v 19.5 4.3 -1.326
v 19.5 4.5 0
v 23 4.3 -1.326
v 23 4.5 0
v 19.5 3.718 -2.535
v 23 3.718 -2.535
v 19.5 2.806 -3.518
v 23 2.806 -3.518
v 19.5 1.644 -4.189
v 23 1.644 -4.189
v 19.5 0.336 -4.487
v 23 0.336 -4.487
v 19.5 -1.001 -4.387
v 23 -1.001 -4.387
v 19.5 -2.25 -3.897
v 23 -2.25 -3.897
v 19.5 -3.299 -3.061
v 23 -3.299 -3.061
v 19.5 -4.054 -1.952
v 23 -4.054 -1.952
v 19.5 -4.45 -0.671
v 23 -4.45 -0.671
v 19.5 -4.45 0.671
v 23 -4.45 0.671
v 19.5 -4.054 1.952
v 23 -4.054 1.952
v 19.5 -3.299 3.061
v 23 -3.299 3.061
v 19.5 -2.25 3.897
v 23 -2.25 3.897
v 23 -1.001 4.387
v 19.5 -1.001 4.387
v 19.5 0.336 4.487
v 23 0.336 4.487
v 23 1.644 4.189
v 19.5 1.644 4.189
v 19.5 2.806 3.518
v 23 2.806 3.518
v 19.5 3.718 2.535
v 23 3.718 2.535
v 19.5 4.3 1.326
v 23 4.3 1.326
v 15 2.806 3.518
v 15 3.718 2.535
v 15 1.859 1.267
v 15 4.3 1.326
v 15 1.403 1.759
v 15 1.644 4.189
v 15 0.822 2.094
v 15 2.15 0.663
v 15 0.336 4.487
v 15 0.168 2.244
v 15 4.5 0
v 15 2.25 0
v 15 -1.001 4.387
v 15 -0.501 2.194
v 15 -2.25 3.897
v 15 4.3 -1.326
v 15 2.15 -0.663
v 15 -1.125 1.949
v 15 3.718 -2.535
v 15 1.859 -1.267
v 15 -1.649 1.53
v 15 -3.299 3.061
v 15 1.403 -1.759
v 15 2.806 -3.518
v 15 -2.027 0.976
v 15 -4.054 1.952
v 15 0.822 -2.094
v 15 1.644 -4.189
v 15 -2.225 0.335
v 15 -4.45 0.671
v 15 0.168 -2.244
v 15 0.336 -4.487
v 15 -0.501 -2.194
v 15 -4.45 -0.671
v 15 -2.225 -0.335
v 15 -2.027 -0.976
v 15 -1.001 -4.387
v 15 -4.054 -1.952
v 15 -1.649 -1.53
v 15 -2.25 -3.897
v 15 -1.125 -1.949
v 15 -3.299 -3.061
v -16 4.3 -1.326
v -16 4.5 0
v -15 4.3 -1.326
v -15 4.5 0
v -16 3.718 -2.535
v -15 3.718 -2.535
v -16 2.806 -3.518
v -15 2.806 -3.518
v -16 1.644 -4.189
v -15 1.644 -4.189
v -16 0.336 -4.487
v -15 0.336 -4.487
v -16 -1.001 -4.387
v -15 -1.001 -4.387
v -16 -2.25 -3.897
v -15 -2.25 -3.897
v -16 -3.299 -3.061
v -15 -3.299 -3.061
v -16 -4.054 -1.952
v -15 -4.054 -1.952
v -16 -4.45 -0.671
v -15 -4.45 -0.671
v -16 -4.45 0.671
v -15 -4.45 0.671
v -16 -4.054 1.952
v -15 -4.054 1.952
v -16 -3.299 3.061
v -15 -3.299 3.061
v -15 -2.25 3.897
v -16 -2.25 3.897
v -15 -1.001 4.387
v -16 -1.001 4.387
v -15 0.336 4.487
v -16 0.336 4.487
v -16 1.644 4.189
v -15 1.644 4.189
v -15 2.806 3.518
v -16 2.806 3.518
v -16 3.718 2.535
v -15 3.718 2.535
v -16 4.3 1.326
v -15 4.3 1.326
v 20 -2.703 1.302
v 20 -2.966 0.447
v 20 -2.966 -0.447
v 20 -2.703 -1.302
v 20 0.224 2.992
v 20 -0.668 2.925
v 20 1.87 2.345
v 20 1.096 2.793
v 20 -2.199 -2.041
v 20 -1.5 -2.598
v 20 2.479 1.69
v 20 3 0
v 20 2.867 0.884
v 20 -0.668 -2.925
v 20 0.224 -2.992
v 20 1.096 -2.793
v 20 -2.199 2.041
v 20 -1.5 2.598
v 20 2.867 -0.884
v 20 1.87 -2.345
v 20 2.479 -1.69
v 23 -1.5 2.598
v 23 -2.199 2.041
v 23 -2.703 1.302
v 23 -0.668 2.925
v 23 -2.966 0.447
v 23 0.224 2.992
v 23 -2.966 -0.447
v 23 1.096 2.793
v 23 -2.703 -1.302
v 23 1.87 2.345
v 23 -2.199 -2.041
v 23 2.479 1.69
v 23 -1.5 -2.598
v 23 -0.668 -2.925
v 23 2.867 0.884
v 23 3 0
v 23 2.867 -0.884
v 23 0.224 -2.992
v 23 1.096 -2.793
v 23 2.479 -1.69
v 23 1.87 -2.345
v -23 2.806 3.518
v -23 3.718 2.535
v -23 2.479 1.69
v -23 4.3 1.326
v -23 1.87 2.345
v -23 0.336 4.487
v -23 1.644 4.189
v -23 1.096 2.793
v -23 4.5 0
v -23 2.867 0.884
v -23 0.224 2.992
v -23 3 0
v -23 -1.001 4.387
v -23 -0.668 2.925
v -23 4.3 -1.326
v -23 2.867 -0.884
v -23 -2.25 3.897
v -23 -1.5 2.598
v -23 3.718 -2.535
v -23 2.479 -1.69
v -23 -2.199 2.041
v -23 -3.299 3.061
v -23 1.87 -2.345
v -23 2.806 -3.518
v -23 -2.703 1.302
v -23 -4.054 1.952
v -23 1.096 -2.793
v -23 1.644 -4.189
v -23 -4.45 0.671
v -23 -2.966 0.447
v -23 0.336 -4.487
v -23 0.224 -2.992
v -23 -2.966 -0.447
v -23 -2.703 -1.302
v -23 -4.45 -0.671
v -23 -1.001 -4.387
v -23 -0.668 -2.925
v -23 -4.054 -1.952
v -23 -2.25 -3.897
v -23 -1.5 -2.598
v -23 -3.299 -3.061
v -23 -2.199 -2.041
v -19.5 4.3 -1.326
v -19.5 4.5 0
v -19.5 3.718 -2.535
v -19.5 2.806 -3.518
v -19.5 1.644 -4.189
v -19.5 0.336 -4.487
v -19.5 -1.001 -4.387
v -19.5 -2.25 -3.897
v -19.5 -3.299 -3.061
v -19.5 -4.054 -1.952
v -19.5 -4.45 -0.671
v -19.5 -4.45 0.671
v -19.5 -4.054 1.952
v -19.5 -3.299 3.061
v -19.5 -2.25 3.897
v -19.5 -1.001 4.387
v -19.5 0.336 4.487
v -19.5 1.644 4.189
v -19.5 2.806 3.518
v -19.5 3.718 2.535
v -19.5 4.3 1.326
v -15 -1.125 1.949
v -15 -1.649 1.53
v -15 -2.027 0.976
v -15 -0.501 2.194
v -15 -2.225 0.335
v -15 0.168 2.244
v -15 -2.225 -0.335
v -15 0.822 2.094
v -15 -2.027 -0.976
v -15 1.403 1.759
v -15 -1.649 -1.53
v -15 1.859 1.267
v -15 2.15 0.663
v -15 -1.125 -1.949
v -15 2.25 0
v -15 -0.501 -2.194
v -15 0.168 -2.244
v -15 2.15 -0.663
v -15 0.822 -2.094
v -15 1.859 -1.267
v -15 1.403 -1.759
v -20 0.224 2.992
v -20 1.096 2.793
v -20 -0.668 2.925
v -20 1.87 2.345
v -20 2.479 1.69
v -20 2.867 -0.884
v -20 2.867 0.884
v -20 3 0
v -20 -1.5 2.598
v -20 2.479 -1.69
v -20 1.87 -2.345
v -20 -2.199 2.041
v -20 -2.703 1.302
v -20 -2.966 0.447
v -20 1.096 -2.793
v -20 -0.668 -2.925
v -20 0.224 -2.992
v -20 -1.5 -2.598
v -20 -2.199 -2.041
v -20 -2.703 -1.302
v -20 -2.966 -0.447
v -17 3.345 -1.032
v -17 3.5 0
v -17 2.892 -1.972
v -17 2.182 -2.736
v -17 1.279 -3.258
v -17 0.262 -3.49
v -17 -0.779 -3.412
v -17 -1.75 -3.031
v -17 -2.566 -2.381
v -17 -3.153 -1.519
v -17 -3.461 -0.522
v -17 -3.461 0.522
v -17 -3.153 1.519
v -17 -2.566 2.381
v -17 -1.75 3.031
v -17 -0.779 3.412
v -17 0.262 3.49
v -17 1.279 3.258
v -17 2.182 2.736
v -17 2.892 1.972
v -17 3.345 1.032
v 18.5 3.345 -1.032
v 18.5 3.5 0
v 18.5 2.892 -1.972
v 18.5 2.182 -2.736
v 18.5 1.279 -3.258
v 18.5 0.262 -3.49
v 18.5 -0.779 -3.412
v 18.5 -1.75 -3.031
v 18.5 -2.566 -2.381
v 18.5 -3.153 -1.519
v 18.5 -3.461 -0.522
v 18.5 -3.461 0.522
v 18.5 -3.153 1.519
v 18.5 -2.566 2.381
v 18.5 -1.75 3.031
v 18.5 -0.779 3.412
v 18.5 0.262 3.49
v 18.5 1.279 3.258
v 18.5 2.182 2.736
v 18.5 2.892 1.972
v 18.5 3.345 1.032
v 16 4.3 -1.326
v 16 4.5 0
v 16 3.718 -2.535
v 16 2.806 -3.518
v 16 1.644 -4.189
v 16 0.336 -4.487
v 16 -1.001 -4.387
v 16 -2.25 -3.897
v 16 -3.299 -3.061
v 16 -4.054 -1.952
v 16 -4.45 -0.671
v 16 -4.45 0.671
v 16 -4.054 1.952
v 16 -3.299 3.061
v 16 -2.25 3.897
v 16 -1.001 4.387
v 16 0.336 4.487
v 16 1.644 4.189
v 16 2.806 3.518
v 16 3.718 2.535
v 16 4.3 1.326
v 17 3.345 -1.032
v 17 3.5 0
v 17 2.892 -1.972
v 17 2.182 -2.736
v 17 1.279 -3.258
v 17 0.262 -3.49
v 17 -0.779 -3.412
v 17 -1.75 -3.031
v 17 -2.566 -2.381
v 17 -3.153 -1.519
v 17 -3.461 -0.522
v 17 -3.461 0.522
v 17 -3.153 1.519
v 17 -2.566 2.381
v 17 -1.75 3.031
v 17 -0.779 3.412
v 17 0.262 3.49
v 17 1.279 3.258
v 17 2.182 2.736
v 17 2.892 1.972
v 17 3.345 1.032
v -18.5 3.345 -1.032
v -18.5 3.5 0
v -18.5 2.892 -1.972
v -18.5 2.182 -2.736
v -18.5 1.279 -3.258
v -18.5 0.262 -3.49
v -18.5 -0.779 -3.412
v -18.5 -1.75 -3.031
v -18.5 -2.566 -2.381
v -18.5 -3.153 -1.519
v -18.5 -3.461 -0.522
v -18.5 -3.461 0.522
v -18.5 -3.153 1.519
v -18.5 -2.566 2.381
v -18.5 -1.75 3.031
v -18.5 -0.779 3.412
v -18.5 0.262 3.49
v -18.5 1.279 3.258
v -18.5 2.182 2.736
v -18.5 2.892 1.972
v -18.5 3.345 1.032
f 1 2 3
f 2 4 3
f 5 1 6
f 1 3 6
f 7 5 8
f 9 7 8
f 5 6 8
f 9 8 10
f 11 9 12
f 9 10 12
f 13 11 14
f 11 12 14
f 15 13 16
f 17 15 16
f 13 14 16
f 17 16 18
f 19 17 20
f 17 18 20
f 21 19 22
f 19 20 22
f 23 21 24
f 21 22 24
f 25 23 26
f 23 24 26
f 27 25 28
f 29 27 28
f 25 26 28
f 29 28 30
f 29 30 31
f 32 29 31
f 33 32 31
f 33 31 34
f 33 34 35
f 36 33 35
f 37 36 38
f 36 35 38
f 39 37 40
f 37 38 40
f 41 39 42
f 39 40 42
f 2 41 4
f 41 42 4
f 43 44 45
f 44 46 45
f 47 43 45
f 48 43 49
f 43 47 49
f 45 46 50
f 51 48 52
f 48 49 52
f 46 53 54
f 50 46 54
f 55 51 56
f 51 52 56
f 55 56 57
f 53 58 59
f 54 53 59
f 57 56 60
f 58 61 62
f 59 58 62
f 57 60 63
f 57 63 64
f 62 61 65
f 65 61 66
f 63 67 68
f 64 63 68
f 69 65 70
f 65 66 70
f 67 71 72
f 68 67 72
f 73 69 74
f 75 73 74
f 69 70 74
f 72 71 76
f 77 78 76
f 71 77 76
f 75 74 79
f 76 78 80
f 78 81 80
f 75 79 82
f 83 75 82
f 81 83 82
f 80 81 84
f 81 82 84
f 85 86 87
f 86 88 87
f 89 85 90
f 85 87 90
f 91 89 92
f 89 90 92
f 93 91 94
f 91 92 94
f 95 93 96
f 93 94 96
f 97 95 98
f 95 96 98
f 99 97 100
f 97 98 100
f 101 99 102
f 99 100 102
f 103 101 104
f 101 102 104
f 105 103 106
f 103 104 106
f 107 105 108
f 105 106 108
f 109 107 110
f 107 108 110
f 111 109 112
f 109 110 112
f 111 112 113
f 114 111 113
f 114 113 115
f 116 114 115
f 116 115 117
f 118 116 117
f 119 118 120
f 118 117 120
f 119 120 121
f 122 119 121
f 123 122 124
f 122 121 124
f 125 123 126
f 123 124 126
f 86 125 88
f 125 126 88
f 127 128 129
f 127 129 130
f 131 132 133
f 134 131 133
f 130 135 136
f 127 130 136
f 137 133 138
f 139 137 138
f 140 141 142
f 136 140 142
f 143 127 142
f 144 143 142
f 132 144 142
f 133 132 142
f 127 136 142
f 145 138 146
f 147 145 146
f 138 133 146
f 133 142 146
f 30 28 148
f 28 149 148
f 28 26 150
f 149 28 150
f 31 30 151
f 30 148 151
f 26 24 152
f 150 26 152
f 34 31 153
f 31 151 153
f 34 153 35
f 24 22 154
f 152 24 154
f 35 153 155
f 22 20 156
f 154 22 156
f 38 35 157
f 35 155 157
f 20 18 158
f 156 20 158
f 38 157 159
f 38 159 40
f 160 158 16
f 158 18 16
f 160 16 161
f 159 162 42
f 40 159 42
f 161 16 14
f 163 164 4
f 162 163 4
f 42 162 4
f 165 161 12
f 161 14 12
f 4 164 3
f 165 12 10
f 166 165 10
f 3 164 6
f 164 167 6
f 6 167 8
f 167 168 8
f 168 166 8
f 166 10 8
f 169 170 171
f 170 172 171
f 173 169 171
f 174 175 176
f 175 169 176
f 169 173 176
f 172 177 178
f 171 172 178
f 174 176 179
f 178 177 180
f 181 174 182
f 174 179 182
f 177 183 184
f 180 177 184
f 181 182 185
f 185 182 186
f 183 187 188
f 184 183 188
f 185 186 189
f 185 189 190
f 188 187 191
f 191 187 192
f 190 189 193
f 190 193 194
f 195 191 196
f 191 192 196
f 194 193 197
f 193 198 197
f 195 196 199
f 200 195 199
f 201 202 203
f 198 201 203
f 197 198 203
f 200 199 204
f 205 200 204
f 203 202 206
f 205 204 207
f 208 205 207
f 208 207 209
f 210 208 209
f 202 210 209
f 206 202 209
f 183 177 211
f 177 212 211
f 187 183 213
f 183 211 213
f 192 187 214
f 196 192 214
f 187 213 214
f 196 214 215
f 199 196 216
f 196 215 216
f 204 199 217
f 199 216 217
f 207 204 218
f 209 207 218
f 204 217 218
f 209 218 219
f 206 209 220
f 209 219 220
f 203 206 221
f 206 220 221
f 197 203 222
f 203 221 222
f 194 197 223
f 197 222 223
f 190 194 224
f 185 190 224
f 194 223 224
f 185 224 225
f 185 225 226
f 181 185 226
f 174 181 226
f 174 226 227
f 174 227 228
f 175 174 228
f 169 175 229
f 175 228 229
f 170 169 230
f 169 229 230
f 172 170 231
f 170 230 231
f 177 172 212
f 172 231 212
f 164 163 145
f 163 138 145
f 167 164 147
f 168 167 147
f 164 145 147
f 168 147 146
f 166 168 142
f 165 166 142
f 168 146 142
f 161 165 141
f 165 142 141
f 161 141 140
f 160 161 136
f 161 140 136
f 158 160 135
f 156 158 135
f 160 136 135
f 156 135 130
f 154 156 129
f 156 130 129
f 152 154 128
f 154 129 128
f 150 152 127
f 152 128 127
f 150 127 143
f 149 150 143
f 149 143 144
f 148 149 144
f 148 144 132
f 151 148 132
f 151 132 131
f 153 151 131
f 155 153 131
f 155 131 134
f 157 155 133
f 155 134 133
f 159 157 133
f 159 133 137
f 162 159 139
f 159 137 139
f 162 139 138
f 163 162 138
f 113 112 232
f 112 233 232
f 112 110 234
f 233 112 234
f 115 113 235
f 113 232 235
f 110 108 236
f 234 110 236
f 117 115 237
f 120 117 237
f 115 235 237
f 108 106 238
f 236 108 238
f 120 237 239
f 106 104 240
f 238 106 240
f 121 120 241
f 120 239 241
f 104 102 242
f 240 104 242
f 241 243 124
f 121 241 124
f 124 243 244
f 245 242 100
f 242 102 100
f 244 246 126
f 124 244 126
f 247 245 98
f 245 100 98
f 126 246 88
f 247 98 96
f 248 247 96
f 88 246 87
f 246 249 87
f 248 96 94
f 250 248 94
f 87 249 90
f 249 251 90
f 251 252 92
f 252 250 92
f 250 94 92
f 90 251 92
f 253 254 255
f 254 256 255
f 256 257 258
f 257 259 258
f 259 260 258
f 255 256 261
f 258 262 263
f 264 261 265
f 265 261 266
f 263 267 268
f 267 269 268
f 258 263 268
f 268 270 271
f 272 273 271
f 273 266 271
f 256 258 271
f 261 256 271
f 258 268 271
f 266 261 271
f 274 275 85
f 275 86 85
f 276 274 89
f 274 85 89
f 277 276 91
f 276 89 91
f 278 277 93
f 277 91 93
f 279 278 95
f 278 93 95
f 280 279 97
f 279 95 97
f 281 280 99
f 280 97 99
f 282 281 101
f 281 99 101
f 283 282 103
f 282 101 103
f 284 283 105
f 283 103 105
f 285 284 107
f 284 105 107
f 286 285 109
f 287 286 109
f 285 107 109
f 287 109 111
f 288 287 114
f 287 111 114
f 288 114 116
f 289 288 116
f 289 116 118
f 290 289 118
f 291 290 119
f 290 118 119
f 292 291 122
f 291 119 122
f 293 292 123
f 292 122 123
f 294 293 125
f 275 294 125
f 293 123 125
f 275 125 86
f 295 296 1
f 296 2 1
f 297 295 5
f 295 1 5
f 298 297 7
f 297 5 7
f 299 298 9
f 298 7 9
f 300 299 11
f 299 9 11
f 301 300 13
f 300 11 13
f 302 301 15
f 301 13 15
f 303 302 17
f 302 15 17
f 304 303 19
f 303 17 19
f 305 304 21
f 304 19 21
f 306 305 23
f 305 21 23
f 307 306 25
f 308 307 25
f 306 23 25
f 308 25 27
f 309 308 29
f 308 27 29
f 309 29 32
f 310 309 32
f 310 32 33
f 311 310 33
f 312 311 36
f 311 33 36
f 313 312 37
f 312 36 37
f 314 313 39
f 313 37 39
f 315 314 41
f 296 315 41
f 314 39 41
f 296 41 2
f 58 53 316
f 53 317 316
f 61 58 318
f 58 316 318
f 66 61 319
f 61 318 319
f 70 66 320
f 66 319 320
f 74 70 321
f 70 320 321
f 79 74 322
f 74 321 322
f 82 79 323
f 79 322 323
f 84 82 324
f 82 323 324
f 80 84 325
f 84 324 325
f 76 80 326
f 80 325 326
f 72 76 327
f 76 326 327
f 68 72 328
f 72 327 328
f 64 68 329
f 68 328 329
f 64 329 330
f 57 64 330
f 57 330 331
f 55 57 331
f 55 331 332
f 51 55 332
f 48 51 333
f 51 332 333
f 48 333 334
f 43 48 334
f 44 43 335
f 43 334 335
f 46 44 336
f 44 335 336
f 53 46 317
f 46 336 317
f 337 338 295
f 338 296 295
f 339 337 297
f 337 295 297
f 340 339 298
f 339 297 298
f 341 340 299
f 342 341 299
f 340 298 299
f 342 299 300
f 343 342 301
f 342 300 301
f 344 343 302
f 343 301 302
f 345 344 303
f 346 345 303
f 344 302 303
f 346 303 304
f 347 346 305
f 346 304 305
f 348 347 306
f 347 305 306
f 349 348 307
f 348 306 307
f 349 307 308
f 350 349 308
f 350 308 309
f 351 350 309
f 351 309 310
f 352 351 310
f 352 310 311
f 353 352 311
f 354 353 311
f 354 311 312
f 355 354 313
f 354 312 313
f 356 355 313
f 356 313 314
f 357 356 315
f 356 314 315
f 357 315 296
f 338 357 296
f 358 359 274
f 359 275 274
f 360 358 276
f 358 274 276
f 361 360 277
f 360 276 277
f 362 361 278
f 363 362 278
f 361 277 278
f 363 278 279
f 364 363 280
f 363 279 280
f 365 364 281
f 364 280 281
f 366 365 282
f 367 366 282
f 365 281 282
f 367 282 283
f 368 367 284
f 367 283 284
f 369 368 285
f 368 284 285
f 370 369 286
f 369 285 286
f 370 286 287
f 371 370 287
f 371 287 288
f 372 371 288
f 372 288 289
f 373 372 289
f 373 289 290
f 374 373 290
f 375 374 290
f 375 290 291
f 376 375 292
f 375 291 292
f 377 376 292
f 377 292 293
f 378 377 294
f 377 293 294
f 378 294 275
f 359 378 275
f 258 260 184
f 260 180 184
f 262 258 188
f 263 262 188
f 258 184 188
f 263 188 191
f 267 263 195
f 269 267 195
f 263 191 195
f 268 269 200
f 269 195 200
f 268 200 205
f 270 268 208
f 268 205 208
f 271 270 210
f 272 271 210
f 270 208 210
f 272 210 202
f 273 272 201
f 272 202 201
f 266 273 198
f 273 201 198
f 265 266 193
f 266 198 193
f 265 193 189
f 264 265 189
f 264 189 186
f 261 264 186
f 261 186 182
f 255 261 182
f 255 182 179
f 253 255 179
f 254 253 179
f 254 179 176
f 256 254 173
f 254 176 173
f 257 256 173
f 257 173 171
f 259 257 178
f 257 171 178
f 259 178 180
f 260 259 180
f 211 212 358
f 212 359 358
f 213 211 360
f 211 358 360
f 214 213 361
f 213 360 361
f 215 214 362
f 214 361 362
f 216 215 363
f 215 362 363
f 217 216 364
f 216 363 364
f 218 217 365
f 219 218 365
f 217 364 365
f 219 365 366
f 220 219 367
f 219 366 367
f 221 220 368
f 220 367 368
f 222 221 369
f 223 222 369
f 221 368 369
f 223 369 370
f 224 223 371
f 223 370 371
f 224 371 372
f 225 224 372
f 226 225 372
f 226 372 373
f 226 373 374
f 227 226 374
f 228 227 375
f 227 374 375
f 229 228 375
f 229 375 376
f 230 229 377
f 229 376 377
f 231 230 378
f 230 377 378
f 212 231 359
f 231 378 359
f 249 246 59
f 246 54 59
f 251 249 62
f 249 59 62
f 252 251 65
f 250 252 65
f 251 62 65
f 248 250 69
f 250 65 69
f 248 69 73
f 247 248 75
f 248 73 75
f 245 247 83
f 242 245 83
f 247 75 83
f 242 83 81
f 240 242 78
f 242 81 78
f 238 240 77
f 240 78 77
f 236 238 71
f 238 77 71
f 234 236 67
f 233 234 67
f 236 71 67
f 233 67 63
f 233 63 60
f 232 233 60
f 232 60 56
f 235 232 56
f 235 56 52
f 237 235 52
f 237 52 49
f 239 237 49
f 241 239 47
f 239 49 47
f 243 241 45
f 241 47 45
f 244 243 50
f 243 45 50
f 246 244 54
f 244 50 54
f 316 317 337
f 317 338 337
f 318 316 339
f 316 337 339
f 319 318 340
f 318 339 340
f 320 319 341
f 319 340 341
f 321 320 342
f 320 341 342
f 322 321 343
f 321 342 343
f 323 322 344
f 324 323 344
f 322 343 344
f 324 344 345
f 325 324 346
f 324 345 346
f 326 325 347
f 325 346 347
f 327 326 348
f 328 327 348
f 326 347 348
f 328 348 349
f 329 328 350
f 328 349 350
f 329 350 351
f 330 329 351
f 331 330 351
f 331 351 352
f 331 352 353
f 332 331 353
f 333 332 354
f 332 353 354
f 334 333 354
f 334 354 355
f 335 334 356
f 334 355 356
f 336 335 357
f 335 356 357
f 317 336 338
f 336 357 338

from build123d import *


with BuildPart() as part:
    # Esquisse1 → Revolution1 (revolve)
    with BuildSketch(Plane.XY):
        Polygon((0, 0), (-20, 0), (-20, 3), (-23, 3), (-23, 4.5), (-19.5, 4.5), (-18.5, 3.5), (-17, 3.5), (-16, 4.5), (-15, 4.5), (-15, 2.25), (15, 2.25), (15, 4.5), (16, 4.5), (17, 3.5), (18.5, 3.5), (19.5, 4.5), (23, 4.5), (23, 3), (20, 3), (20, 0), align=None)
    revolve(axis=Axis((0, 0, 0), (-1, 0, 0)))


solid = part.part
